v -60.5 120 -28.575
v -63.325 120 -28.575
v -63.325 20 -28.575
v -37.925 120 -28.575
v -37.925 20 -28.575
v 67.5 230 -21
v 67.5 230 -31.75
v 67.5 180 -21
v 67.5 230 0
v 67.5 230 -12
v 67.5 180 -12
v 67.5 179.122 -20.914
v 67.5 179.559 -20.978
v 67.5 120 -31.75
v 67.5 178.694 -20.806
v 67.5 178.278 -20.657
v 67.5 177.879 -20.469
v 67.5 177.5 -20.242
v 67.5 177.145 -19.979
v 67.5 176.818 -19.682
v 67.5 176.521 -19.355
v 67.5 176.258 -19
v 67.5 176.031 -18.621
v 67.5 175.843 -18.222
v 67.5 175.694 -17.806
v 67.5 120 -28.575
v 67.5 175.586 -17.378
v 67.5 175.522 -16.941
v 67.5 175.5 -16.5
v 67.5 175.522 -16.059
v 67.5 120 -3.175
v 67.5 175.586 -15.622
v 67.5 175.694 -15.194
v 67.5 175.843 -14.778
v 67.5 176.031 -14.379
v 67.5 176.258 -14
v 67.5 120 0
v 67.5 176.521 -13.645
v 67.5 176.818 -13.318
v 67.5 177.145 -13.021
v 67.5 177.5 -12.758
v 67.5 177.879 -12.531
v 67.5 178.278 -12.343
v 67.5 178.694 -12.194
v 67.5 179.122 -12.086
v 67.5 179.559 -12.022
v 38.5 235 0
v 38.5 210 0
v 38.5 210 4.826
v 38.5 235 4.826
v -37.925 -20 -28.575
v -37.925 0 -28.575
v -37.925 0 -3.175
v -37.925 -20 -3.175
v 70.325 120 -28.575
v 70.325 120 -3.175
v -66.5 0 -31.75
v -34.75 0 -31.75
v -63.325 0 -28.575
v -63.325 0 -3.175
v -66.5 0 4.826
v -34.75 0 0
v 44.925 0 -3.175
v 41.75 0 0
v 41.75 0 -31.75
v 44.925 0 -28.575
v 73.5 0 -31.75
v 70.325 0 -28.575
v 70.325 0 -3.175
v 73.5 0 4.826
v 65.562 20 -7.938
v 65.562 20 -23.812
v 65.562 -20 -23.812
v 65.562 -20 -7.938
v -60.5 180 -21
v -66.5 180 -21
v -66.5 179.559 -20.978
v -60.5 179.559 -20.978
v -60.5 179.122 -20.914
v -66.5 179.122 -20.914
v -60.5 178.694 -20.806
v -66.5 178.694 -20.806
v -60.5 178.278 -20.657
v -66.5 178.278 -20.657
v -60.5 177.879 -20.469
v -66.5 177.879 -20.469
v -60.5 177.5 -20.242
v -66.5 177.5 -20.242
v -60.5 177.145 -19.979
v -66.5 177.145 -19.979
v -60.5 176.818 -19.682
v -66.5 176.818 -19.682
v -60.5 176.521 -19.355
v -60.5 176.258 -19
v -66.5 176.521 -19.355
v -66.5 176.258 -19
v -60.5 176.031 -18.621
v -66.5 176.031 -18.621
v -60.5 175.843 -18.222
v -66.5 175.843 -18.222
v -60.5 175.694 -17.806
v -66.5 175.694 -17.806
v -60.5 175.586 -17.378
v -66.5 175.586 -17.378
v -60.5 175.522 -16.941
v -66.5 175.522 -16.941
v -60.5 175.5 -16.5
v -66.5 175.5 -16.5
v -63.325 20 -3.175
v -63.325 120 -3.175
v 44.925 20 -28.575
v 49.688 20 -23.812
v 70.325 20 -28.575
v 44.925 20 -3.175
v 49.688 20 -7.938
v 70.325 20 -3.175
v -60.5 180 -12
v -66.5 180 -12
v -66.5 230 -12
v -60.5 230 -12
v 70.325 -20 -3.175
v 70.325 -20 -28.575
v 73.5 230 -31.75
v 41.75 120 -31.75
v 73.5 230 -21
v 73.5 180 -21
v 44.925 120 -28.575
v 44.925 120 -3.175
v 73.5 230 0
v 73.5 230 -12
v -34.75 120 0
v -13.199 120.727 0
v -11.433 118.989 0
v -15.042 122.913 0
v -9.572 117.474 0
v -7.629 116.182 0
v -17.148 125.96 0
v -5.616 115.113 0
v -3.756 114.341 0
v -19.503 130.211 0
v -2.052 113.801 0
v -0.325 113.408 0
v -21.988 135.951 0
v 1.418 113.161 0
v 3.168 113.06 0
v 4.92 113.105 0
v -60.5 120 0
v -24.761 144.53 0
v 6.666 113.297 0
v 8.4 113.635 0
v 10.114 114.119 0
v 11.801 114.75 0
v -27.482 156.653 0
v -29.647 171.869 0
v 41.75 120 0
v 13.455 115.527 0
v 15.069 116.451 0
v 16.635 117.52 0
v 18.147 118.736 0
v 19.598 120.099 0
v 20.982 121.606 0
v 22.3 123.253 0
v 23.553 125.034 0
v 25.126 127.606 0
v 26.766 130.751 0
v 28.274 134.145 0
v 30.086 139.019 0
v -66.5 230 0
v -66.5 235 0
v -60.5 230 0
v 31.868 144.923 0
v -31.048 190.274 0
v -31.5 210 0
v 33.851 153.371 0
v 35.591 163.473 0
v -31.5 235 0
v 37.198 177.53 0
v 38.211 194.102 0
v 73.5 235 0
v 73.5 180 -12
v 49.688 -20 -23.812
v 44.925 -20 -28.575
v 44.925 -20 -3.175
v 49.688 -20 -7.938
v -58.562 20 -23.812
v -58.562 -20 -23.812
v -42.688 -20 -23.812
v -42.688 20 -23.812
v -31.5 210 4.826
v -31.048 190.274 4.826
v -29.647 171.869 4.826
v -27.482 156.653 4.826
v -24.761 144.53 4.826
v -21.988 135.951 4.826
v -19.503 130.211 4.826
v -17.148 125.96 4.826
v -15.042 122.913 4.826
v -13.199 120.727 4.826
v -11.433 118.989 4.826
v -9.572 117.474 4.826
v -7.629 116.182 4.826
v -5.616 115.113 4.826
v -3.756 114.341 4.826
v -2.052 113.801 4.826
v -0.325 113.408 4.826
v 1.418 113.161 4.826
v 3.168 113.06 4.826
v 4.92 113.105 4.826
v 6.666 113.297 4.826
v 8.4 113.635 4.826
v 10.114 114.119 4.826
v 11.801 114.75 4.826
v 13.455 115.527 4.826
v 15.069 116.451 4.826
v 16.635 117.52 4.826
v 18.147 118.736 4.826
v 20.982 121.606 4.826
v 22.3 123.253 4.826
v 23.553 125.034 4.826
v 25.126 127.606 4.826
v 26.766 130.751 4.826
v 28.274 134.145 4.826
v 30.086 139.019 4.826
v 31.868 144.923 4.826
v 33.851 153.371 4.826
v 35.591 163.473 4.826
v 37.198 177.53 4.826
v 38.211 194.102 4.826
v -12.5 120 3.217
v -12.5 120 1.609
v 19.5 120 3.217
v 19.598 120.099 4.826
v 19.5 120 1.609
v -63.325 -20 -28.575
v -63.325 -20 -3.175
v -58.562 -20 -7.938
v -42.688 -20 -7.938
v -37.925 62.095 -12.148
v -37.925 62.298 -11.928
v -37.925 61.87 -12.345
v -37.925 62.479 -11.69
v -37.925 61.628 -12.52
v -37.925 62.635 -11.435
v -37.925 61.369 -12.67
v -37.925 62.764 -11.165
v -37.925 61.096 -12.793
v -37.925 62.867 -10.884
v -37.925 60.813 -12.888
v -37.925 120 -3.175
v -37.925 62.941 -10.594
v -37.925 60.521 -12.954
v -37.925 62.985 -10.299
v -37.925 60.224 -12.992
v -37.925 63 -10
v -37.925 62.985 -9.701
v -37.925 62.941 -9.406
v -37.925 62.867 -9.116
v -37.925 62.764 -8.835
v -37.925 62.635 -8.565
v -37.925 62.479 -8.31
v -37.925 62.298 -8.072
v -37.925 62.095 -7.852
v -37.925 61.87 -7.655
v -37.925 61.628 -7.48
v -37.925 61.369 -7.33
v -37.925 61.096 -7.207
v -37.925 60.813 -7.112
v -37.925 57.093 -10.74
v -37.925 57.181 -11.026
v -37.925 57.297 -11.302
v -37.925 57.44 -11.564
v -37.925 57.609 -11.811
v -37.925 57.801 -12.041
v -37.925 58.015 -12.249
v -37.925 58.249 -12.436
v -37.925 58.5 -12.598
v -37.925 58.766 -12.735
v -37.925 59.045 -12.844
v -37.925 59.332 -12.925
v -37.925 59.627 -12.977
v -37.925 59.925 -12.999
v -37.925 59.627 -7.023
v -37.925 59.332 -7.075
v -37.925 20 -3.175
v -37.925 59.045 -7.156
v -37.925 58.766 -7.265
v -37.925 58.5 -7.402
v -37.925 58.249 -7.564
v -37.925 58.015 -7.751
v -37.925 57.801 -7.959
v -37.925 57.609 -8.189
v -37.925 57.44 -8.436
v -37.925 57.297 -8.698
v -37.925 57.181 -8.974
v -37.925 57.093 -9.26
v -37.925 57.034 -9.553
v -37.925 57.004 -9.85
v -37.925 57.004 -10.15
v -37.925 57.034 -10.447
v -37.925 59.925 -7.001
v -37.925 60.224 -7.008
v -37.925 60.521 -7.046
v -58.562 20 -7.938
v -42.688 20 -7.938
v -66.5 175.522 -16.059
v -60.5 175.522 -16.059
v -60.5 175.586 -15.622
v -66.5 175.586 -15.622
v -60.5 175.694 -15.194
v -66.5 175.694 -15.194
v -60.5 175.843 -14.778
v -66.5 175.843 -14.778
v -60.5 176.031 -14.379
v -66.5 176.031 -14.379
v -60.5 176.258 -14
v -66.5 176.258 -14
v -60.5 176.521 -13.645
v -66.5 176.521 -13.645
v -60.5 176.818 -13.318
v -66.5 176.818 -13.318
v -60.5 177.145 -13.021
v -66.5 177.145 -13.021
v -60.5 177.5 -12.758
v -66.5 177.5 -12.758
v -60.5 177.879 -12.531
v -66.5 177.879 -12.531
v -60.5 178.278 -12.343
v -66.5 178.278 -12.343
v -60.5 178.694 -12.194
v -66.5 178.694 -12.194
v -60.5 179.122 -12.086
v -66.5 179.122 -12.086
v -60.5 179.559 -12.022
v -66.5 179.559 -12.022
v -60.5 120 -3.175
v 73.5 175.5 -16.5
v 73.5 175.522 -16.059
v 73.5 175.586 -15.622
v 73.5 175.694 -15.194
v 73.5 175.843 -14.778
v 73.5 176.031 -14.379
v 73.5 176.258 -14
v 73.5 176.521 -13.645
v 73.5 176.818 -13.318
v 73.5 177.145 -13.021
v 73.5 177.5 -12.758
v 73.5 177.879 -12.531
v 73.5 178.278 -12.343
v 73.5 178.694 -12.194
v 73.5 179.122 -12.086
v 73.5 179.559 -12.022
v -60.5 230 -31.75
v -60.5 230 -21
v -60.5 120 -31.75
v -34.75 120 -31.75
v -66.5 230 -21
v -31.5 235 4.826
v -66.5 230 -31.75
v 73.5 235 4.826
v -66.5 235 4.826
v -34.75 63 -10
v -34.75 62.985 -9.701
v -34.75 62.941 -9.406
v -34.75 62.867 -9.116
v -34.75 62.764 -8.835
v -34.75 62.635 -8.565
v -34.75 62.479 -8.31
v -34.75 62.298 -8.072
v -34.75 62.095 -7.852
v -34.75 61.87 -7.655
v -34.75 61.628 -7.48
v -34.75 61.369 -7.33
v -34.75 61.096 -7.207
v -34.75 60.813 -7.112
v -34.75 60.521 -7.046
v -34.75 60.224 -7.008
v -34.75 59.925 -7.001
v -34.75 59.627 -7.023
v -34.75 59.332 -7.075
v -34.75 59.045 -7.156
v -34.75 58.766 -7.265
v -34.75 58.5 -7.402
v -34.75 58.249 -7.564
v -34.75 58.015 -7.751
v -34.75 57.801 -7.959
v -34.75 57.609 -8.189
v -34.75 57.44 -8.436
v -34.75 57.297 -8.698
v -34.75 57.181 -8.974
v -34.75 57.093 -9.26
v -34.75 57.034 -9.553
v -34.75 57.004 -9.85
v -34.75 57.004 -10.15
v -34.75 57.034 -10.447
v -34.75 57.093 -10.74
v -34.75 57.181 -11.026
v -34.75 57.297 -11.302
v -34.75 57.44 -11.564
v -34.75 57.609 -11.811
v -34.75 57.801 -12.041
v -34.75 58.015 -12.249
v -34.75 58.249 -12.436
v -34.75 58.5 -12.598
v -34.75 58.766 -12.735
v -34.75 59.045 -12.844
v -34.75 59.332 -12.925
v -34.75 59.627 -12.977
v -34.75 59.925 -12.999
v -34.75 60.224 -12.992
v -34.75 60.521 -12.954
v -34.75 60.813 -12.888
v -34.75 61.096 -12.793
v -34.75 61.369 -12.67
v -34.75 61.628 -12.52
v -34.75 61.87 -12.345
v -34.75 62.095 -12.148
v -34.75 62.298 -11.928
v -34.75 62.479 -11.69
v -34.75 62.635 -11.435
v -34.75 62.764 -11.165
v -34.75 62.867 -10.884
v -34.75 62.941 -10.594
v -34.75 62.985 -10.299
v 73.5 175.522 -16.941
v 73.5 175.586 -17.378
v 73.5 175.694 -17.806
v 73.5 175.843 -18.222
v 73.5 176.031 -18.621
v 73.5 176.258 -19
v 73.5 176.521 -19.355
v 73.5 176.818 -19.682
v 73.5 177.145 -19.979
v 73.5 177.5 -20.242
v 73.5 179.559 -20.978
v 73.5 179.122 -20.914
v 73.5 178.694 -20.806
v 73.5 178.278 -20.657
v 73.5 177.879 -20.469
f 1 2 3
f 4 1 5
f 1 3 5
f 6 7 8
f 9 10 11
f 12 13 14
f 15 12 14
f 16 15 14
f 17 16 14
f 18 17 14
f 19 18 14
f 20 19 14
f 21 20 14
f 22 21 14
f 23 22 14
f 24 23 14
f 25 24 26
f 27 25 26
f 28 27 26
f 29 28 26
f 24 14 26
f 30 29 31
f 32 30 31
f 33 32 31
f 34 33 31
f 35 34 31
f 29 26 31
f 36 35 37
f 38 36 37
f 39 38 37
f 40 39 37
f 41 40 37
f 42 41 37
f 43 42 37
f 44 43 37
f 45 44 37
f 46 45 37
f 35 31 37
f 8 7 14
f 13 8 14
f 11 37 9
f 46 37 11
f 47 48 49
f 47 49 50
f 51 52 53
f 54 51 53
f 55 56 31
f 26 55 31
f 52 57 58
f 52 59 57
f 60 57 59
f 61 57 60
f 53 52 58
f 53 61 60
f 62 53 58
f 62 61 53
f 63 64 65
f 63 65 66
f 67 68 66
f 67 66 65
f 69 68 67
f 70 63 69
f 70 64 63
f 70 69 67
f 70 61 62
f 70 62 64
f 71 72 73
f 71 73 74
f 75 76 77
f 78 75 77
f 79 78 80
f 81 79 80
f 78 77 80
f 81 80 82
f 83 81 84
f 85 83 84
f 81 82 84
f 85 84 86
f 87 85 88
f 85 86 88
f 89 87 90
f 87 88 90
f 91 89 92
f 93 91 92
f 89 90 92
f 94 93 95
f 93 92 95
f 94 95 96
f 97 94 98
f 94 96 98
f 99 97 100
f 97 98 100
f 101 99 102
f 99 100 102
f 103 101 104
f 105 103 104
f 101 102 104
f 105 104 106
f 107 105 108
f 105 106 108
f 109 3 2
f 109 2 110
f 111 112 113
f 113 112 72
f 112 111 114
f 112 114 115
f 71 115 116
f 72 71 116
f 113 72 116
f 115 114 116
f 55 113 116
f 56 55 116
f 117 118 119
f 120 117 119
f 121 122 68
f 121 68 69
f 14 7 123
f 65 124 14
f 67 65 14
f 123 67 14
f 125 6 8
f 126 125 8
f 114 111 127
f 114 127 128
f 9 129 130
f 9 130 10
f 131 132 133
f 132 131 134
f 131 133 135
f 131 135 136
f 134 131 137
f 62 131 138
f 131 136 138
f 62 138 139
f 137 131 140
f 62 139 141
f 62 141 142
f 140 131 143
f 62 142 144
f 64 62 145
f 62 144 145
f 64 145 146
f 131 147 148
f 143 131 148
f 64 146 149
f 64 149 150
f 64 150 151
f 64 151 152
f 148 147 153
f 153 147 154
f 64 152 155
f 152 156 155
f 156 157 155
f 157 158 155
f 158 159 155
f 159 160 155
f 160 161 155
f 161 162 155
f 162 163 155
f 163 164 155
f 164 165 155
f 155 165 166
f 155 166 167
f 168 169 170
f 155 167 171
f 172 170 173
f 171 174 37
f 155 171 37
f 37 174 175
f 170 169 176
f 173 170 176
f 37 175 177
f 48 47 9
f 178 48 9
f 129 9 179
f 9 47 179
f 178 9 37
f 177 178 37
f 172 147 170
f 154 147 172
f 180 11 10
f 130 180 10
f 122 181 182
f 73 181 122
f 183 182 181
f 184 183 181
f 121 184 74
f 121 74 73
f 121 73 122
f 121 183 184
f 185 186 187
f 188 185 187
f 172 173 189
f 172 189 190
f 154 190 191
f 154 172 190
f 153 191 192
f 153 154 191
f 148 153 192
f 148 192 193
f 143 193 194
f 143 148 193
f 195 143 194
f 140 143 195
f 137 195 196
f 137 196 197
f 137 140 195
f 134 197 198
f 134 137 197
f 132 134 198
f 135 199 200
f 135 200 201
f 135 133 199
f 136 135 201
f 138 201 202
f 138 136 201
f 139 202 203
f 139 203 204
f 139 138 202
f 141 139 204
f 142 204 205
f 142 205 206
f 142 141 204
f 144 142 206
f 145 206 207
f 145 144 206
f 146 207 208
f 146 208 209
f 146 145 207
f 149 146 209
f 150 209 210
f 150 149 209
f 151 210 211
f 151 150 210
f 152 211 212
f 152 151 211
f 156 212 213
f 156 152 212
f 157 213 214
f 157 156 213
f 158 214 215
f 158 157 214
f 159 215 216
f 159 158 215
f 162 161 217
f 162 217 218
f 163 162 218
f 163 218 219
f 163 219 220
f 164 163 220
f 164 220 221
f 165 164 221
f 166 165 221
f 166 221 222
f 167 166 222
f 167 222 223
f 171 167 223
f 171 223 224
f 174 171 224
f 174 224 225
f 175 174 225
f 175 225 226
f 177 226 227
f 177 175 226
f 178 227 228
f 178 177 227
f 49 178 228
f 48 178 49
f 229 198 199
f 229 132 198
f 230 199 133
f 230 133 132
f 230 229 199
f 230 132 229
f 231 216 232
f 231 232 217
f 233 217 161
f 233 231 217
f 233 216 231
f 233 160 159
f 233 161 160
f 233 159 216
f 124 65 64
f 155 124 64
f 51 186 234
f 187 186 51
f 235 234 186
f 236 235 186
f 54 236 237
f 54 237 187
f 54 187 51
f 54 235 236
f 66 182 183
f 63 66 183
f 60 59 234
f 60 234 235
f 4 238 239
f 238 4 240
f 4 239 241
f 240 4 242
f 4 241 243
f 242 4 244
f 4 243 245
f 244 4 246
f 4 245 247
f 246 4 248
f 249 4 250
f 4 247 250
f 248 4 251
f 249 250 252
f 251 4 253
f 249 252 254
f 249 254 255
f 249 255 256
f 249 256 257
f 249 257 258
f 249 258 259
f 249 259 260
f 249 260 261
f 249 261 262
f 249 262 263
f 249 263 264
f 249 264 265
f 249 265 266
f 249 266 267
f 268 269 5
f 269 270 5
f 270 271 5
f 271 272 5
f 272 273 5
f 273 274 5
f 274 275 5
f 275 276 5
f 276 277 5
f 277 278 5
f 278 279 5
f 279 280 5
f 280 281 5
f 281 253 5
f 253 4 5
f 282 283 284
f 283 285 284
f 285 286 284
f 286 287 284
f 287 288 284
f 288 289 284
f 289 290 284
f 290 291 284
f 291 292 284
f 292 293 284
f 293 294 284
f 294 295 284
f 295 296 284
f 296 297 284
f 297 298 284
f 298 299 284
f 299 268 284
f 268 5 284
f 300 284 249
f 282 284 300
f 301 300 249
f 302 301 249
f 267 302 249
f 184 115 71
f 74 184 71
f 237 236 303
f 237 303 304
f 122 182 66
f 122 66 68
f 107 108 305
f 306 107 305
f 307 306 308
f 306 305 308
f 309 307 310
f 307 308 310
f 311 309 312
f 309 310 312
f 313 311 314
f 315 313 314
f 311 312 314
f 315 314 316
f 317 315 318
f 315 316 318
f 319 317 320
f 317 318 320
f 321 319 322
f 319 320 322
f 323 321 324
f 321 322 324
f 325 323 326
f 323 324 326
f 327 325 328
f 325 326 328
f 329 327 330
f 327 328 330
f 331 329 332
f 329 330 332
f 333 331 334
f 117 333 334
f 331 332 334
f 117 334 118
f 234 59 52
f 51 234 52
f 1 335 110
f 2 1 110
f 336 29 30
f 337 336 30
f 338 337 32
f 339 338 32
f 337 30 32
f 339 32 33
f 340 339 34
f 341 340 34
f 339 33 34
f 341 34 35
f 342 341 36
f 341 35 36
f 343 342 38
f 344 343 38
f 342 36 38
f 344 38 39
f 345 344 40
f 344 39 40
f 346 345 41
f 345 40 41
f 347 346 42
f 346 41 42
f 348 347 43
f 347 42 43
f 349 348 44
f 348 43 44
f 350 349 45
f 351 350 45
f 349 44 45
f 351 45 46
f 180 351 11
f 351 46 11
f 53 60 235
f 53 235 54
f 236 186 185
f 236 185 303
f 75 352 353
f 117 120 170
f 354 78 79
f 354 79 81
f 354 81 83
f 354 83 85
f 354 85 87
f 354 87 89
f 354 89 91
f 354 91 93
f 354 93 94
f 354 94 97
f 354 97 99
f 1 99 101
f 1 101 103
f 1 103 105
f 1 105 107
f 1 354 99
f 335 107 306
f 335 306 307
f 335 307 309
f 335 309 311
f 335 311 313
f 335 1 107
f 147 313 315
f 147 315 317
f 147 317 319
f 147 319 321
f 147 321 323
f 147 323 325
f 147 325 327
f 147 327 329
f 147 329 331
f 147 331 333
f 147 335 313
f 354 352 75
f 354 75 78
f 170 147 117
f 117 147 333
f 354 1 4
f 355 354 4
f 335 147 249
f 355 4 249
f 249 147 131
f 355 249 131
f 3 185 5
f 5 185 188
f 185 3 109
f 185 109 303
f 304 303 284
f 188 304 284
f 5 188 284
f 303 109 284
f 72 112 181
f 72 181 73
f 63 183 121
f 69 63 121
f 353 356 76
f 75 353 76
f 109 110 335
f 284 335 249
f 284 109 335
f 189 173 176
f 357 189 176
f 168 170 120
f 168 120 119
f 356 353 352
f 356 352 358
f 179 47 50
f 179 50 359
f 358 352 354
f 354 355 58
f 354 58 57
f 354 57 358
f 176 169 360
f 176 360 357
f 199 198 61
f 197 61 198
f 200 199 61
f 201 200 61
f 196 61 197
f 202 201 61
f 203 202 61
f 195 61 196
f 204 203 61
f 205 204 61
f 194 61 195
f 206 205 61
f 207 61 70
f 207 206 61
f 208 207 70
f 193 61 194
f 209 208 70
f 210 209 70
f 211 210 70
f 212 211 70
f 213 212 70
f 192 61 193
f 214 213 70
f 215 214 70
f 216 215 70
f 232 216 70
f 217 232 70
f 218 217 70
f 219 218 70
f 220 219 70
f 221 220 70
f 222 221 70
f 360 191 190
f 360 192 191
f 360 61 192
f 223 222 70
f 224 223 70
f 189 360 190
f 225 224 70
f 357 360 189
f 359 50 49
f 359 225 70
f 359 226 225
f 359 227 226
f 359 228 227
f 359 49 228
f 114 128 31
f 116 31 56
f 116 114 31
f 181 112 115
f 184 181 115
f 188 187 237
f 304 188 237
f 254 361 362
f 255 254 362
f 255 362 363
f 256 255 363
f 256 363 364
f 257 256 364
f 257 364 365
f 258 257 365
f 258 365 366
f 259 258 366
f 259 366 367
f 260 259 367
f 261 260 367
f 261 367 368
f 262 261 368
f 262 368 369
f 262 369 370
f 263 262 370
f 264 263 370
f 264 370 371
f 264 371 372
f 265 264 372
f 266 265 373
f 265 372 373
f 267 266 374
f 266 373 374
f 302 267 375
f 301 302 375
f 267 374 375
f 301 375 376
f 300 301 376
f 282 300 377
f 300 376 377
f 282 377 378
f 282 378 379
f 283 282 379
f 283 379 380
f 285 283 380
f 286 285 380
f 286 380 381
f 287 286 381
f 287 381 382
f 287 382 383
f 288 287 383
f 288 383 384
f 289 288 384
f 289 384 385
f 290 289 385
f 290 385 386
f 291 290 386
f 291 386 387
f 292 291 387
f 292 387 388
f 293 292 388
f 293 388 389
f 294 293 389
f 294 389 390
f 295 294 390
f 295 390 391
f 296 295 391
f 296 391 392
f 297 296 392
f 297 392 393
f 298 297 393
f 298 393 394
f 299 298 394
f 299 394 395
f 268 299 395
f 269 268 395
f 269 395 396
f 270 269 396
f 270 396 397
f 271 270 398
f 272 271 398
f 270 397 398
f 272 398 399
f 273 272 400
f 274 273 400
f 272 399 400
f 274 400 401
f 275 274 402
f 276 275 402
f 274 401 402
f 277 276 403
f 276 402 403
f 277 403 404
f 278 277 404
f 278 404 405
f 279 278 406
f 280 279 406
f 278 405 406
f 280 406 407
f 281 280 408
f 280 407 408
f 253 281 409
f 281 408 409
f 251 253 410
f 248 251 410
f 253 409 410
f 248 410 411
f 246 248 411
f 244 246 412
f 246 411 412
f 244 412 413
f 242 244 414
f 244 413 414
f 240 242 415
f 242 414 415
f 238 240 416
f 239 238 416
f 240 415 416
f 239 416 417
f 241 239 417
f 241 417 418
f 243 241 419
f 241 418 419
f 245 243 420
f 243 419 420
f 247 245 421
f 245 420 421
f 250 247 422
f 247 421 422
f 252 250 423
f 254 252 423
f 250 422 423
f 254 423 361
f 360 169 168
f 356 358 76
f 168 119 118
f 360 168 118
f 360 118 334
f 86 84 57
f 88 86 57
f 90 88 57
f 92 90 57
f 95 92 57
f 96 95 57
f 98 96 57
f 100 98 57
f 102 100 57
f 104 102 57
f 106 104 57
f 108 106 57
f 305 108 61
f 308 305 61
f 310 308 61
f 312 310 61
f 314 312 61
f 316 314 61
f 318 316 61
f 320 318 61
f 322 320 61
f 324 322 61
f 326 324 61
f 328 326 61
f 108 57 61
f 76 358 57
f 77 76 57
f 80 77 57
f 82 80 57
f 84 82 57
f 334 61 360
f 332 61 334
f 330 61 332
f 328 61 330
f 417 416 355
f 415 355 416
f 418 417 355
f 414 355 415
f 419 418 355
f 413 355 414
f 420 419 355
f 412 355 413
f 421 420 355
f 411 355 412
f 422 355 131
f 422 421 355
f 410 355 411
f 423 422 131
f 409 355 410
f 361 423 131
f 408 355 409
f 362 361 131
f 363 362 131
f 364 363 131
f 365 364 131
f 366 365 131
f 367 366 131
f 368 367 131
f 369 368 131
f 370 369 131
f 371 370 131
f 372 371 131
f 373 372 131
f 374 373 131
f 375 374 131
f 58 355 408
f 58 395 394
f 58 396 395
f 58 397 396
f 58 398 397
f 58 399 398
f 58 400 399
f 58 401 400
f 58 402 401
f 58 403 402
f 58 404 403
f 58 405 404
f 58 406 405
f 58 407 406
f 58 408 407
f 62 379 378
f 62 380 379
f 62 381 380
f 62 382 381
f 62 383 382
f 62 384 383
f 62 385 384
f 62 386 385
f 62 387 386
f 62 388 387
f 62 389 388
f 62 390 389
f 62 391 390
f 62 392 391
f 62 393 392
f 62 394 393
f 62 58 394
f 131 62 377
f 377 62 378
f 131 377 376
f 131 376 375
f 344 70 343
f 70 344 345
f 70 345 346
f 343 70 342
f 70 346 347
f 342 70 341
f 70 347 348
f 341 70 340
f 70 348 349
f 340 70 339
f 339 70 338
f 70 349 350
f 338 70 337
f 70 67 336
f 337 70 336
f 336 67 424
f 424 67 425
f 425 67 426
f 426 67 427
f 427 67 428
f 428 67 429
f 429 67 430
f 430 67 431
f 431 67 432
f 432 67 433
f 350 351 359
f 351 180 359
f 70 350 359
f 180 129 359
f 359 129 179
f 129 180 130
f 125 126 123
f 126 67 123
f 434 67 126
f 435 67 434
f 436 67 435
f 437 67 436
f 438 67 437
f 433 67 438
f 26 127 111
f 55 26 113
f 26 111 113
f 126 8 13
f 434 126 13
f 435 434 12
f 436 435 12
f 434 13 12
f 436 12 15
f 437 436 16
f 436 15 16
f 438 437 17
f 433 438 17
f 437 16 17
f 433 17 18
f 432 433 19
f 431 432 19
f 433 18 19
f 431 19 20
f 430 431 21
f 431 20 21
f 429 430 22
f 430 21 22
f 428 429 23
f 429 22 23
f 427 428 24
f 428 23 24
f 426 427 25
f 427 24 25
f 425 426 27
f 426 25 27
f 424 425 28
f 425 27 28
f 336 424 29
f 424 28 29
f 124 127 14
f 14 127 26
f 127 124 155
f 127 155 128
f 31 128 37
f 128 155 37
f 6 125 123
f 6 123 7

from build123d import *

# Parameters (mm, degrees)
F0_W      = 140
F0_H      = 110
F0_W_2    = 35
F0_H_2    = 25
F1_DEPTH  = 4.826
F2_W      = 31.75
F2_H      = 31.75
F2_W_2    = 25.4
F2_H_2    = 25.4
F3_DEPTH  = 120
F4_W      = 6
F4_H      = 31.75
F4_W_2    = 2.825
F4_H_2    = 25.4
F5_DEPTH  = 110
F6_R      = 3
F7_DEPTH  = 10
F8_W      = 25.4
F8_H      = 25.4
F8_W_2    = 15.874
F8_H_2    = 15.874
F9_DEPTH  = 20
F11_DEPTH = 152


with BuildPart() as f1:
    # F0 (on Top) → F1 (new body)
    with BuildSketch(Plane.XY):
        with Locations((3.5, 55)):
            Rectangle(F0_W, F0_H)
        with BuildLine():
            Line((-66.5, 210), (-66.5, 110))
            Line((-66.5, 110), (73.5, 110))
            Line((73.5, 110), (73.5, 210))
            Line((73.5, 210), (38.5, 210))
            add(Edge.make_bspline(
                [(-31.5, 210), (-31.5, 178), (-26.1927577262, 110.7427430843), (33.1927577262, 110.7427430843), (38.5, 178), (38.5, 210)],
                knots=[0, 0, 0, 0, 0.3861272069, 0.6138727931, 1, 1, 1, 1], degree=3))
            Line((-31.5, 210), (-66.5, 210))
        make_face()
        with Locations((-49, 222.5)):
            Rectangle(F0_W_2, F0_H_2)
        with Locations((56, 222.5)):
            Rectangle(F0_W_2, F0_H_2)
    extrude(amount=F1_DEPTH)

    # F2 (on face) → F3 (join)
    with BuildSketch(Plane.XZ):
        with Locations((-50.625, -15.875)):
            Rectangle(F2_W, F2_H)
        with Locations((-50.625, -15.875)):
            Rectangle(F2_W_2, F2_H_2, mode=Mode.SUBTRACT)
        with Locations((57.625, -15.875)):
            Rectangle(F2_W, F2_H)
        with Locations((57.625, -15.875)):
            Rectangle(F2_W_2, F2_H_2, mode=Mode.SUBTRACT)
    extrude(amount=-F3_DEPTH)

    # F4 (on face) → F5 (join)
    with BuildSketch(Plane(origin=(0, 120, 0), x_dir=(-1, 0, 0), z_dir=(0, 1, 0))):
        with Locations((63.5, -15.875)):
            Rectangle(F4_W, F4_H)
        with Locations((-68.9125, -15.875)):
            Rectangle(F4_W_2, F4_H_2)
        Polygon((-67.5, 0), (-73.5, 0), (-73.5, -31.75), (-70.325, -31.75), (-67.5, -31.75), (-67.5, -28.575), (-70.325, -28.575), (-70.325, -3.175), (-67.5, -3.175), align=None)
    extrude(amount=F5_DEPTH)

    # F6 (on face) → F7 (cut)
    with BuildSketch(Plane.YZ.offset(-34.75)):
        with Locations((60, -10)):
            Circle(F6_R)
    extrude(amount=-F7_DEPTH, mode=Mode.SUBTRACT)

    # F8 (on face) → F9 (join, symmetric)
    with BuildSketch(Plane.XZ):
        with Locations((-50.625, -15.875)):
            Rectangle(F8_W, F8_H)
        with Locations((-50.625, -15.875)):
            Rectangle(F8_W_2, F8_H_2, mode=Mode.SUBTRACT)
        with Locations((57.625, -15.875)):
            Rectangle(F8_W, F8_H)
        with Locations((57.625, -15.875)):
            Rectangle(F8_W_2, F8_H_2, mode=Mode.SUBTRACT)
    extrude(amount=F9_DEPTH, both=True)

    # F10 (on face) → F11 (cut)
    with BuildSketch(Plane(origin=(-66.5, 0, 0), x_dir=(0, -1, 0), z_dir=(-1, 0, 0))):
        with BuildLine():
            ThreePointArc((-180, -21), (-176.8180194847, -19.6819805153), (-175.5, -16.5))
            ThreePointArc((-175.5, -16.5), (-176.8180194847, -13.3180194847), (-180, -12))
            Line((-180, -12), (-180, -16.5))
            Line((-180, -16.5), (-180, -21))
        make_face()
        with BuildLine():
            Line((-180, -16.5), (-180, -12))
            ThreePointArc((-180, -12), (-184.5, -16.5), (-180, -21))
            Line((-180, -21), (-180, -16.5))
        make_face()
        with BuildLine():
            ThreePointArc((-180, -21), (-184.5, -16.5), (-180, -12))
            Line((-180, -12), (-230, -12))
            Line((-230, -12), (-230, -21))
            Line((-230, -21), (-180, -21))
        make_face()
    extrude(amount=-F11_DEPTH, mode=Mode.SUBTRACT)


solid = f1.part
